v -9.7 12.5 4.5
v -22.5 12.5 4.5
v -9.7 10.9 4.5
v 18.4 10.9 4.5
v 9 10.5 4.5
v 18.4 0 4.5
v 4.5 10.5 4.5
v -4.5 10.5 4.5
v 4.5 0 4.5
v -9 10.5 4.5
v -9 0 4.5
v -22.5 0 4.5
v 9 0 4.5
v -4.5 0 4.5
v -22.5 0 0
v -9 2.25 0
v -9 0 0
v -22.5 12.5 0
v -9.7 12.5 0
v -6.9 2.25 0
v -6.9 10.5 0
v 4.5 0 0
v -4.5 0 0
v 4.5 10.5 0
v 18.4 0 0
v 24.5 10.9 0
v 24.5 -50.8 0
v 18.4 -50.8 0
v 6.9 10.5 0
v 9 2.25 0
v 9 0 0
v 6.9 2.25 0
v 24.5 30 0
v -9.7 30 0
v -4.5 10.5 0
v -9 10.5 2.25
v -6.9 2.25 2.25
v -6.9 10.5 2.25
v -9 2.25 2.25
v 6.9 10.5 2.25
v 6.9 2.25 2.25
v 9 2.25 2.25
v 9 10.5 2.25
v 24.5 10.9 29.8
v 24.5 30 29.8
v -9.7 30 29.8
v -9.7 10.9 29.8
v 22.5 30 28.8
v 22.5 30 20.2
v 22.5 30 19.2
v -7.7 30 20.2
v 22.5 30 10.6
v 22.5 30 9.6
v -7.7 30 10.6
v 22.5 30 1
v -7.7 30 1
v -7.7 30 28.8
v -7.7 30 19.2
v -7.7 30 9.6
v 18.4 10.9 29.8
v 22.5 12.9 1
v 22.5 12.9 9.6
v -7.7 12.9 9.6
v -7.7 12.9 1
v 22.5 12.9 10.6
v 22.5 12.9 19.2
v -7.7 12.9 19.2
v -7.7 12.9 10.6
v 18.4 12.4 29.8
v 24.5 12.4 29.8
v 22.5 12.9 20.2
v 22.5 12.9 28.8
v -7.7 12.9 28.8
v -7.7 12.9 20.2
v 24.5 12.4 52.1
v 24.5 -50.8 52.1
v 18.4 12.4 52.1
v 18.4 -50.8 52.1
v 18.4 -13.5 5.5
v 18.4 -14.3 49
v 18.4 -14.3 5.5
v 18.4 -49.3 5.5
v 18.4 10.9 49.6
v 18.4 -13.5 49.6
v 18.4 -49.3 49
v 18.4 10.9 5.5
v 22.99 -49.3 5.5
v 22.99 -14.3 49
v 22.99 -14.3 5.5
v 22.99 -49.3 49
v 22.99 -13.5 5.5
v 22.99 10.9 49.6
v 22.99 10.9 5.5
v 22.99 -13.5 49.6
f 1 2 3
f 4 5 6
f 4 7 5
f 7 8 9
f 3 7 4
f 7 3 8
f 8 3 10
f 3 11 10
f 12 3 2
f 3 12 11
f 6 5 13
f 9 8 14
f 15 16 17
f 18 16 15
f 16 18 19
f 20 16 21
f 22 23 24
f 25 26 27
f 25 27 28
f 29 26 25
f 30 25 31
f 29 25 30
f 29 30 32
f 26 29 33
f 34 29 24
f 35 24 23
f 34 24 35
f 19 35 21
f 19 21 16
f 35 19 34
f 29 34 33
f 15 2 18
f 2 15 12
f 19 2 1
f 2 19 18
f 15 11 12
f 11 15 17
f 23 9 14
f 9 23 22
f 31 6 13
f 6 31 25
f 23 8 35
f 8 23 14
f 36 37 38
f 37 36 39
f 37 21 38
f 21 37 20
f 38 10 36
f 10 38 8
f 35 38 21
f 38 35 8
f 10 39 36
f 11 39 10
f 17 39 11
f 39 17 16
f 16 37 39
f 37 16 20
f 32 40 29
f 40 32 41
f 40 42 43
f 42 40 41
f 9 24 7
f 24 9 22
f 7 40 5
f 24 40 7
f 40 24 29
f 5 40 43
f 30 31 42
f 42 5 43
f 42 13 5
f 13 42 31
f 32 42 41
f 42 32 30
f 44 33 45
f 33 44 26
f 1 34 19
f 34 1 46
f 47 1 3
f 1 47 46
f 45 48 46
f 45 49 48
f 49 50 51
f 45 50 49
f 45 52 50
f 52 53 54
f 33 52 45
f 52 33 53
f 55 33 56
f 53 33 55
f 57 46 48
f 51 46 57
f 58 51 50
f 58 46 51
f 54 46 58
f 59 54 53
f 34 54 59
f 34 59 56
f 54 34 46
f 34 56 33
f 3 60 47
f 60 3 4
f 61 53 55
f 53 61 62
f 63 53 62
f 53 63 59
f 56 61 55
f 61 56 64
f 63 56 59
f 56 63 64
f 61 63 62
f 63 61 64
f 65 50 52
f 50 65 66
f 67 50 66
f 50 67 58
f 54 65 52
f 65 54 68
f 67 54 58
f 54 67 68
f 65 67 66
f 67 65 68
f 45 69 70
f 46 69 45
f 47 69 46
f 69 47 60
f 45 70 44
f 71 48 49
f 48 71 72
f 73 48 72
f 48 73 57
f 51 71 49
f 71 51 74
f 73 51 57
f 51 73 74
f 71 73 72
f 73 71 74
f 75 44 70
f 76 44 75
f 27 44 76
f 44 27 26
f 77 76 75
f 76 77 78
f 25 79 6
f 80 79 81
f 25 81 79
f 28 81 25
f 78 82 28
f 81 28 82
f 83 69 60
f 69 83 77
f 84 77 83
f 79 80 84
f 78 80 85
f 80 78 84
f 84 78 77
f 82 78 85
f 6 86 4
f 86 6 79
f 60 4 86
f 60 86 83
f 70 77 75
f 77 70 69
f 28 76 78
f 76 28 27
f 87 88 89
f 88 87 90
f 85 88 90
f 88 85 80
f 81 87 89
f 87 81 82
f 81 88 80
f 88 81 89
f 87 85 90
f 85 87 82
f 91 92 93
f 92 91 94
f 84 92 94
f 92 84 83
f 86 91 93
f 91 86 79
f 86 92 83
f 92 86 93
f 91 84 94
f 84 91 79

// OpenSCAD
// file: pcb-model-sizes.scad
pcbSmtLvSize=[65.94, 33.75];
pcbDevkitcRelaySize=[57.53, 31.88];
pcbCurrentSensorSize=[35,43.5];
pcbContactorPsuSize=[24.4,44.1];

pcbRelayHeight = 16;

pcbThickness = 1.6;
solderThickness = 3;
wallThickness = 1.5;
partitionThickness = 0.8;

caseMargin = 0.2;
// file: relay-current-enclosure.scad
include <pcb-model-sizes.scad>

currentTopStands=[6, 28];
currentBottomStands = [7, 27];
relayTopStands=[9, 42];
relayBottomStands = [12, 41];
standSize = 2;

module relayCurrentCase() {
    maxY = max(pcbCurrentSensorSize[0], pcbDevkitcRelaySize[1]);
    sizeX = 2 * wallThickness + partitionThickness + pcbDevkitcRelaySize[0] + pcbCurrentSensorSize[1];
    relayYOffset = (maxY - pcbDevkitcRelaySize[1]) / 2;
    difference() {
        cube([sizeX, 2 * wallThickness + maxY, wallThickness + pcbThickness + solderThickness]);
        translate([wallThickness - caseMargin, wallThickness + relayYOffset - caseMargin, wallThickness]) {
            cube([pcbDevkitcRelaySize[0] + 2 * caseMargin, pcbDevkitcRelaySize[1] + 2 * caseMargin, pcbThickness + solderThickness + 0.01]);
        }
        translate([wallThickness + pcbDevkitcRelaySize[0] + partitionThickness, wallThickness + (maxY - pcbCurrentSensorSize[0]) / 2, wallThickness]) {
            cube([pcbCurrentSensorSize[1], pcbCurrentSensorSize[0], pcbThickness + solderThickness + 0.01]);
        }
    }
    translate([wallThickness,wallThickness + relayYOffset,wallThickness]) {
        for(stand = relayBottomStands) {
            translate([stand, 0, 0]){
               cube([standSize, standSize, solderThickness]);
            }
        }
    }

    translate([wallThickness,wallThickness + relayYOffset + pcbDevkitcRelaySize[1] - standSize,wallThickness]) {
        for(stand = relayTopStands) {
            translate([stand, 0, 0]){
               #cube([standSize, standSize, solderThickness]);
            }
        }
    }

    translate([wallThickness + pcbDevkitcRelaySize[0] + partitionThickness,wallThickness,wallThickness]) {
        for(stand = currentBottomStands) {
            translate([stand, 0, 0]){
               cube([standSize, standSize, solderThickness]);
            }
        }
    }

    translate([wallThickness + pcbDevkitcRelaySize[0] + partitionThickness,wallThickness + pcbCurrentSensorSize[0] - standSize,wallThickness]) {
        for(stand = currentTopStands) {
            translate([stand, 0, 0]){
               cube([standSize, standSize, solderThickness]);
            }
        }
    }

    translate([0, 0, wallThickness + pcbThickness + solderThickness - 0.01]) {
        translate([wallThickness + caseMargin, 0, 0]) {
            cube([1 * wallThickness, wallThickness, 2 * wallThickness]);
        }

        translate([sizeX - wallThickness - caseMargin - 1 * wallThickness, 0, 0]) {
            cube([1 * wallThickness, wallThickness, 2 * wallThickness]);
        }

        translate([wallThickness + caseMargin, maxY + wallThickness, 0]) {
            cube([2 * wallThickness, wallThickness, 2 * wallThickness]);
        }

        translate([sizeX - wallThickness - caseMargin - 2 * wallThickness, maxY + wallThickness, 0]) {
            cube([2 * wallThickness, wallThickness, 2 * wallThickness]);
        }
    }
}

module relayCurrentCaseTop() {
    maxY = max(pcbCurrentSensorSize[0], pcbDevkitcRelaySize[1]);
    trayHeight = wallThickness + pcbThickness + solderThickness;

    difference() {
        cube([2 * wallThickness + partitionThickness + pcbDevkitcRelaySize[0] + pcbCurrentSensorSize[1], 4 * wallThickness + maxY, wallThickness + pcbThickness + solderThickness + pcbRelayHeight + wallThickness]);
        translate([-0.01, wallThickness - caseMargin, -0.01]) {
            cube([2 * wallThickness + partitionThickness + pcbDevkitcRelaySize[0] + pcbCurrentSensorSize[1] + 0.02, 2 * wallThickness + maxY + 2 * caseMargin, wallThickness + pcbThickness + solderThickness]);
        }
        translate([wallThickness -0.01, wallThickness, wallThickness + pcbThickness + solderThickness - 0.01]) {
            cube([partitionThickness + pcbDevkitcRelaySize[0] + pcbCurrentSensorSize[1] + 0.02, 2 * wallThickness + maxY, pcbRelayHeight + 0.01]);
        }
        for(hole=[[6,6], [33, 6], [51, 6], [pcbDevkitcRelaySize[0] + partitionThickness + 15.5, 6], [pcbDevkitcRelaySize[0] + partitionThickness + 39, 6]]) {
            translate([wallThickness + hole[0] - hole[1] / 2, - 0.01, 0]) {
                cube([hole[1], wallThickness + 0.02, trayHeight + hole[1]]);
            }
        }
        for(hole=[[16,6], [46, 4], [pcbDevkitcRelaySize[0] + partitionThickness + 28.5, 6]]) {
            translate([wallThickness + hole[0] - hole[1] / 2, 3 * wallThickness + maxY - 0.01, 0]) {
                cube([hole[1], wallThickness + 0.02, trayHeight + hole[1]]);
            }
        }
    }
}

*relayCurrentCase();


translate([0, -wallThickness, wallThickness + pcbThickness + solderThickness + 2]) {
    relayCurrentCaseTop();
}
// file: pcb-models.scad
module pcbDevkitcRelay() {
    rotate([-90, 0, 0]) {
        scale(1000) {
            import("pcb-models/access-control-devkitc-relay.stl");
        }
    }
}

module pcbDevkitcPsu() {
    rotate([-90, 0, 0]) {
        scale(1000) {
            import("pcb-models/access-control-devkitc-relay.stl");
        }
    }
}

module pcbCurrentSensor() {
    rotate([-90, 0, 0]) {
        scale(1000) {
            import("pcb-models/current-sensor-pcb.stl");
        }
    }
}

module pcbSmtLv() {
    rotate([-90, 0, 0]) {
        scale(1000) {
            import("pcb-models/access-control-smt-lv.stl");
        }
    }
}

module pcbContactorPsu() {
    rotate([-90, 0, 0]) {
        scale(1) {
            import("pcb-models/contactor-psu.stl");
        }
    }
}
// main file
fullContactorWidth=45; /*45.3*/
centerWingWidth=18;
centerInnerWingWidth=14;
centerInnerGap=9; /*8.9*/
centerOuterGap=22;
centerToPortEdge = centerOuterGap;
centerWingWall=2.25;
centerWingDepth=10.5;
centerWingSlotDepth=7;
centerToFarEdge = 19;
slotGap = 0.15;
pcbWidth=50;
pcbLength=66;
zeroOffsetToContactorCenter=-5;
pcbWallWidth=2;
pcbClearance=0.5;
pcbClearanceTop=1;
sideWidth = (fullContactorWidth - centerOuterGap) / 2 - centerWingWall;
gapWidth = fullContactorWidth / 2 - sideWidth;
verticalSupportWidth = 20;

wago221s415 = [30.2, 18.6 - 1.5, 8.6];
wago221s413 = [18.7, 18.6 - 1.5, 8.4];
wagoWallWidthH = 1;
wagoWallWidthV = 2;

psuHeight = 3 * wagoWallWidthH + 3 * wago221s415[2];/*22.5*/

use <pcb-models.scad>
use <relay-current-enclosure.scad>
include <pcb-model-sizes.scad>

difference() {
    translate([-fullContactorWidth / 2, 0, 0]) {
        union() {
            sideWidth = (fullContactorWidth - centerOuterGap) / 2 - centerWingWall;
            cube([fullContactorWidth, centerToFarEdge / 2 + 3, 2 * centerWingWall]);
        }
    }
    translate([-centerInnerGap / 2 - centerWingWall - slotGap, 0, 0]) {
        cube([centerWingWall + slotGap, centerWingDepth, centerWingWall]);
    }

    translate([-centerInnerGap / 2 - 2 * centerWingWall, 0, 0]) {
        cube([centerWingWall, centerWingWall, centerWingWall]);
    }

    translate([centerInnerGap / 2, 0, 0]) {
        cube([centerWingWall + slotGap, centerWingDepth, centerWingWall]);
    }

    translate([centerInnerGap / 2 + 1 * centerWingWall, 0, 0]) {
        cube([centerWingWall, centerWingWall, centerWingWall]);
    }

    translate([-centerInnerGap / 2 - (centerWingWall * 2), 0, centerWingWall]) {
        cube([2 * centerWingWall, centerWingDepth, centerWingWall]);
    }

    translate([centerInnerGap / 2 - (centerWingWall * 0), 0, centerWingWall]) {
        cube([2 * centerWingWall, centerWingDepth, centerWingWall]);
    }
}

halfWidthNotWago = (pcbWidth - wago221s415[0] - 2 * wagoWallWidthV)/2;

*translate([-pcbWidth / 2 - pcbWallWidth, -pcbLength / 2 + zeroOffsetToContactorCenter - pcbWallWidth, 0]) {
    cube([pcbWallWidth + halfWidthNotWago , pcbLength + 2 * pcbWallWidth, centerWingWall * 2 + pcbClearance]);
}


*translate([pcbWidth / 2 - halfWidthNotWago , -pcbLength / 2 + zeroOffsetToContactorCenter - pcbWallWidth, 0]) {
    cube([pcbWallWidth + halfWidthNotWago, pcbLength + 2 * pcbWallWidth, centerWingWall * 2 + pcbClearance]);
}

*pcbWalls(showEnds=false);

translate([fullContactorWidth / 2 + pcbWallWidth - (wago221s415[0] + 2 * wagoWallWidthV), pcbLength / 2 + zeroOffsetToContactorCenter - (wago221s415[1] + wagoWallWidthV) + pcbWallWidth, /*centerWingWall * 2 + pcbClearance*/]){
    wagoPort415();
    translate([0, 0, wagoWallWidthH + wago221s415[2]]) {
        wagoPort415();
    }
    translate([0, 0, 2 * wagoWallWidthH + 2 * wago221s415[2]]) {
        wagoPort415();
    }
}

/*

translate([pcbWidth / 2 + pcbWallWidth , zeroOffsetToContactorCenter + pcbLength / 2 + 1 * pcbWallWidth ,wagoWallWidthV  + wago221s415[2]]) {
    translate([-(pcbWallWidth + halfWidthNotWago), -(wago221s415[1] + wagoWallWidthV), -(wagoWallWidthV  + wago221s415[2])]) {
        cube([pcbWallWidth + halfWidthNotWago, wago221s415[1] + wagoWallWidthV, wago221s415[2] + 1 * wagoWallWidthV]);
    }
    rotate([90,-90,0]) {
        wagoPort415();
    }
}

translate([pcbWidth / 2 + pcbWallWidth , zeroOffsetToContactorCenter + pcbLength / 2 + 1 * pcbWallWidth - wagoWallWidthH - 0.01 - wago221s415[2] ,wagoWallWidthV  + wago221s415[2]]) {
    rotate([90,-90,0]) {
        wagoPort415();
    }
}
*/

translate([fullContactorWidth / 2 + pcbWallWidth - pcbThickness - solderThickness - wallThickness , zeroOffsetToContactorCenter + pcbLength / 2 + 1 * pcbWallWidth - wago221s415[1] - 3 * wagoWallWidthH - pcbCurrentSensorSize[0] - pcbContactorPsuSize[0] - 2 * wallThickness - partitionThickness + 2.5, 0]) {
    difference() {
        cube([pcbThickness + solderThickness + wallThickness, pcbCurrentSensorSize[0] + pcbContactorPsuSize[0] + 2 * wallThickness + partitionThickness + 0, 2 * wallThickness + max(pcbCurrentSensorSize[1], pcbContactorPsuSize[1]) + centerWingWall * 2 + 1 * pcbClearance]);
        translate([-0.01, wallThickness, centerWingWall * 2 + 1 * pcbClearance + 0.5]) {
            cube([pcbThickness + solderThickness, pcbCurrentSensorSize[0], pcbCurrentSensorSize[1]]);
        }

        translate([-0.01, wallThickness + pcbCurrentSensorSize[0] + partitionThickness,centerWingWall * 2 + 1 * pcbClearance + 0.5]) {
            cube([pcbThickness + solderThickness, pcbContactorPsuSize[0], pcbContactorPsuSize[1]]);
        }
    }
}


*translate([fullContactorWidth / 2,-18,pcbCurrentSensorSize[1] + centerWingWall * 2 + 2 * pcbClearance]) {
    rotate([90, 0, 0]) {
        rotate([0,-90, 0]) {
            color("green") pcbCurrentSensor();
        }
    }
}

*translate([fullContactorWidth / 2,6, centerWingWall * 2 + 2 * pcbClearance]) {
    psuVertical();
}

module psuVertical() {
    translate([-1.0,7.5,0]) {
        rotate([0, 0, 0]) {
            rotate([0,-90, 0]) {
                color("green") pcbContactorPsu();
            }
        }
    }
}


module pcbWalls(showEnds=true,extraHeight = 0) {
    wallGap = wago221s415[0]/2;

    translate([-pcbWidth / 2 - pcbWallWidth, -pcbLength / 2 + zeroOffsetToContactorCenter - pcbWallWidth, centerWingWall * 2]) {
        cube([pcbWallWidth, pcbLength + 2 * pcbWallWidth, pcbWallWidth * 2 + extraHeight]);
    }

    translate([pcbWidth / 2 , -pcbLength / 2 + zeroOffsetToContactorCenter - pcbWallWidth, centerWingWall * 2]) {
        cube([pcbWallWidth, pcbLength + 2 * pcbWallWidth, pcbWallWidth * 2 + extraHeight]);
    }

    if (showEnds) {
        translate([pcbWidth / 2 - (pcbWidth / 2 - wallGap) , -pcbLength / 2 + zeroOffsetToContactorCenter - pcbWallWidth,centerWingWall * 2]) {
           cube([pcbWallWidth + (pcbWidth / 2 - wallGap), pcbWallWidth, pcbWallWidth * 2 + extraHeight]);
        }
    }

    translate([-pcbWidth / 2 - pcbWallWidth , pcbLength / 2 + zeroOffsetToContactorCenter,centerWingWall * 2]) {
       cube([pcbWallWidth + (pcbWidth / 2 - wallGap), pcbWallWidth, pcbWallWidth * 2 + extraHeight]);
    }

    if (showEnds) {
        translate([-pcbWidth / 2 - pcbWallWidth , -pcbLength / 2 + zeroOffsetToContactorCenter - pcbWallWidth,centerWingWall * 2]) {
           cube([pcbWallWidth + (pcbWidth / 2 - wallGap), pcbWallWidth, pcbWallWidth * 2 + extraHeight]);
        }
    }

    translate([pcbWidth / 2 - (pcbWidth / 2 - wallGap) , pcbLength / 2 + zeroOffsetToContactorCenter,centerWingWall * 2]) {
       cube([pcbWallWidth + (pcbWidth / 2 - wallGap), pcbWallWidth, pcbWallWidth * 2 + extraHeight]);
    }
}

module wagoPort415() {  
    difference(){
        cube([wago221s415[0] + 2 * wagoWallWidthV, wago221s415[1] + wagoWallWidthV, wago221s415[2] + 2 * wagoWallWidthH]);
        translate([wagoWallWidthV, wagoWallWidthV, wagoWallWidthH]) {
            cube([wago221s415[0], wago221s415[1] + 0.01, wago221s415[2]]);
        }
    }
}

module maxWidthPort() {
    difference() {
        cube([pcbWallWidth * 2 + pcbWidth, wago221s415[1] + pcbWallWidth, wago221s415[2] + 2 * pcbWallWidth]);
        translate([pcbWallWidth, -0.01, pcbWallWidth]) {
            cube([pcbWidth, wago221s415[1] + 0.01, wago221s415[2]]);
        }
    }
}
